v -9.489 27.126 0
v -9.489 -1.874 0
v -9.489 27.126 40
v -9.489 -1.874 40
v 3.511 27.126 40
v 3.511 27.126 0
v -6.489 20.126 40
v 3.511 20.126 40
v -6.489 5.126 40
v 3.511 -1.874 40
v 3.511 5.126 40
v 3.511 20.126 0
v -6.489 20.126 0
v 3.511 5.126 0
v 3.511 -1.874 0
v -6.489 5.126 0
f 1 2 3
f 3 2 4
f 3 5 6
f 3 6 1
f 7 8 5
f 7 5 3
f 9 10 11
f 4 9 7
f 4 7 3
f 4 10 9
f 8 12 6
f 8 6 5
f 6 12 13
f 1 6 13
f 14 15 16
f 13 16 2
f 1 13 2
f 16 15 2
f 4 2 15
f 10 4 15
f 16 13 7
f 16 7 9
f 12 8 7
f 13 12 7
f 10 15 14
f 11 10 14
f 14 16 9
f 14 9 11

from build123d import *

# Parameters (mm, degrees)
F0_W     = 13
F0_H     = 7
F1_DEPTH = 40
F2_W     = 7
F2_H     = 40
F2_W_2   = 15
F3_DEPTH = 3
F4_W     = 13
F4_H     = 40
F5_DEPTH = 7


with BuildPart() as f1:
    # F0 (on Top) → F1 (new body)
    with BuildSketch(Plane.XY):
        with Locations((-2.989468, 1.626376)):
            Rectangle(F0_W, F0_H)
    extrude(amount=F1_DEPTH)

    # F2 (on face) → F3 (join)
    with BuildSketch(Plane(origin=(-9.489468, 0, 0), x_dir=(0, -1, 0), z_dir=(-1, 0, 0))):
        with Locations((-1.626376, 20)):
            Rectangle(F2_W, F2_H)
        with Locations((-12.626376, 20)):
            Rectangle(F2_W_2, F2_H)
    extrude(amount=-F3_DEPTH)

    # F4 (on face) → F5 (join)
    with BuildSketch(Plane(origin=(0, 20.126376, 0), x_dir=(-1, 0, 0), z_dir=(0, 1, 0))):
        with Locations((2.989468, 20)):
            Rectangle(F4_W, F4_H)
    extrude(amount=F5_DEPTH)


solid = f1.part
